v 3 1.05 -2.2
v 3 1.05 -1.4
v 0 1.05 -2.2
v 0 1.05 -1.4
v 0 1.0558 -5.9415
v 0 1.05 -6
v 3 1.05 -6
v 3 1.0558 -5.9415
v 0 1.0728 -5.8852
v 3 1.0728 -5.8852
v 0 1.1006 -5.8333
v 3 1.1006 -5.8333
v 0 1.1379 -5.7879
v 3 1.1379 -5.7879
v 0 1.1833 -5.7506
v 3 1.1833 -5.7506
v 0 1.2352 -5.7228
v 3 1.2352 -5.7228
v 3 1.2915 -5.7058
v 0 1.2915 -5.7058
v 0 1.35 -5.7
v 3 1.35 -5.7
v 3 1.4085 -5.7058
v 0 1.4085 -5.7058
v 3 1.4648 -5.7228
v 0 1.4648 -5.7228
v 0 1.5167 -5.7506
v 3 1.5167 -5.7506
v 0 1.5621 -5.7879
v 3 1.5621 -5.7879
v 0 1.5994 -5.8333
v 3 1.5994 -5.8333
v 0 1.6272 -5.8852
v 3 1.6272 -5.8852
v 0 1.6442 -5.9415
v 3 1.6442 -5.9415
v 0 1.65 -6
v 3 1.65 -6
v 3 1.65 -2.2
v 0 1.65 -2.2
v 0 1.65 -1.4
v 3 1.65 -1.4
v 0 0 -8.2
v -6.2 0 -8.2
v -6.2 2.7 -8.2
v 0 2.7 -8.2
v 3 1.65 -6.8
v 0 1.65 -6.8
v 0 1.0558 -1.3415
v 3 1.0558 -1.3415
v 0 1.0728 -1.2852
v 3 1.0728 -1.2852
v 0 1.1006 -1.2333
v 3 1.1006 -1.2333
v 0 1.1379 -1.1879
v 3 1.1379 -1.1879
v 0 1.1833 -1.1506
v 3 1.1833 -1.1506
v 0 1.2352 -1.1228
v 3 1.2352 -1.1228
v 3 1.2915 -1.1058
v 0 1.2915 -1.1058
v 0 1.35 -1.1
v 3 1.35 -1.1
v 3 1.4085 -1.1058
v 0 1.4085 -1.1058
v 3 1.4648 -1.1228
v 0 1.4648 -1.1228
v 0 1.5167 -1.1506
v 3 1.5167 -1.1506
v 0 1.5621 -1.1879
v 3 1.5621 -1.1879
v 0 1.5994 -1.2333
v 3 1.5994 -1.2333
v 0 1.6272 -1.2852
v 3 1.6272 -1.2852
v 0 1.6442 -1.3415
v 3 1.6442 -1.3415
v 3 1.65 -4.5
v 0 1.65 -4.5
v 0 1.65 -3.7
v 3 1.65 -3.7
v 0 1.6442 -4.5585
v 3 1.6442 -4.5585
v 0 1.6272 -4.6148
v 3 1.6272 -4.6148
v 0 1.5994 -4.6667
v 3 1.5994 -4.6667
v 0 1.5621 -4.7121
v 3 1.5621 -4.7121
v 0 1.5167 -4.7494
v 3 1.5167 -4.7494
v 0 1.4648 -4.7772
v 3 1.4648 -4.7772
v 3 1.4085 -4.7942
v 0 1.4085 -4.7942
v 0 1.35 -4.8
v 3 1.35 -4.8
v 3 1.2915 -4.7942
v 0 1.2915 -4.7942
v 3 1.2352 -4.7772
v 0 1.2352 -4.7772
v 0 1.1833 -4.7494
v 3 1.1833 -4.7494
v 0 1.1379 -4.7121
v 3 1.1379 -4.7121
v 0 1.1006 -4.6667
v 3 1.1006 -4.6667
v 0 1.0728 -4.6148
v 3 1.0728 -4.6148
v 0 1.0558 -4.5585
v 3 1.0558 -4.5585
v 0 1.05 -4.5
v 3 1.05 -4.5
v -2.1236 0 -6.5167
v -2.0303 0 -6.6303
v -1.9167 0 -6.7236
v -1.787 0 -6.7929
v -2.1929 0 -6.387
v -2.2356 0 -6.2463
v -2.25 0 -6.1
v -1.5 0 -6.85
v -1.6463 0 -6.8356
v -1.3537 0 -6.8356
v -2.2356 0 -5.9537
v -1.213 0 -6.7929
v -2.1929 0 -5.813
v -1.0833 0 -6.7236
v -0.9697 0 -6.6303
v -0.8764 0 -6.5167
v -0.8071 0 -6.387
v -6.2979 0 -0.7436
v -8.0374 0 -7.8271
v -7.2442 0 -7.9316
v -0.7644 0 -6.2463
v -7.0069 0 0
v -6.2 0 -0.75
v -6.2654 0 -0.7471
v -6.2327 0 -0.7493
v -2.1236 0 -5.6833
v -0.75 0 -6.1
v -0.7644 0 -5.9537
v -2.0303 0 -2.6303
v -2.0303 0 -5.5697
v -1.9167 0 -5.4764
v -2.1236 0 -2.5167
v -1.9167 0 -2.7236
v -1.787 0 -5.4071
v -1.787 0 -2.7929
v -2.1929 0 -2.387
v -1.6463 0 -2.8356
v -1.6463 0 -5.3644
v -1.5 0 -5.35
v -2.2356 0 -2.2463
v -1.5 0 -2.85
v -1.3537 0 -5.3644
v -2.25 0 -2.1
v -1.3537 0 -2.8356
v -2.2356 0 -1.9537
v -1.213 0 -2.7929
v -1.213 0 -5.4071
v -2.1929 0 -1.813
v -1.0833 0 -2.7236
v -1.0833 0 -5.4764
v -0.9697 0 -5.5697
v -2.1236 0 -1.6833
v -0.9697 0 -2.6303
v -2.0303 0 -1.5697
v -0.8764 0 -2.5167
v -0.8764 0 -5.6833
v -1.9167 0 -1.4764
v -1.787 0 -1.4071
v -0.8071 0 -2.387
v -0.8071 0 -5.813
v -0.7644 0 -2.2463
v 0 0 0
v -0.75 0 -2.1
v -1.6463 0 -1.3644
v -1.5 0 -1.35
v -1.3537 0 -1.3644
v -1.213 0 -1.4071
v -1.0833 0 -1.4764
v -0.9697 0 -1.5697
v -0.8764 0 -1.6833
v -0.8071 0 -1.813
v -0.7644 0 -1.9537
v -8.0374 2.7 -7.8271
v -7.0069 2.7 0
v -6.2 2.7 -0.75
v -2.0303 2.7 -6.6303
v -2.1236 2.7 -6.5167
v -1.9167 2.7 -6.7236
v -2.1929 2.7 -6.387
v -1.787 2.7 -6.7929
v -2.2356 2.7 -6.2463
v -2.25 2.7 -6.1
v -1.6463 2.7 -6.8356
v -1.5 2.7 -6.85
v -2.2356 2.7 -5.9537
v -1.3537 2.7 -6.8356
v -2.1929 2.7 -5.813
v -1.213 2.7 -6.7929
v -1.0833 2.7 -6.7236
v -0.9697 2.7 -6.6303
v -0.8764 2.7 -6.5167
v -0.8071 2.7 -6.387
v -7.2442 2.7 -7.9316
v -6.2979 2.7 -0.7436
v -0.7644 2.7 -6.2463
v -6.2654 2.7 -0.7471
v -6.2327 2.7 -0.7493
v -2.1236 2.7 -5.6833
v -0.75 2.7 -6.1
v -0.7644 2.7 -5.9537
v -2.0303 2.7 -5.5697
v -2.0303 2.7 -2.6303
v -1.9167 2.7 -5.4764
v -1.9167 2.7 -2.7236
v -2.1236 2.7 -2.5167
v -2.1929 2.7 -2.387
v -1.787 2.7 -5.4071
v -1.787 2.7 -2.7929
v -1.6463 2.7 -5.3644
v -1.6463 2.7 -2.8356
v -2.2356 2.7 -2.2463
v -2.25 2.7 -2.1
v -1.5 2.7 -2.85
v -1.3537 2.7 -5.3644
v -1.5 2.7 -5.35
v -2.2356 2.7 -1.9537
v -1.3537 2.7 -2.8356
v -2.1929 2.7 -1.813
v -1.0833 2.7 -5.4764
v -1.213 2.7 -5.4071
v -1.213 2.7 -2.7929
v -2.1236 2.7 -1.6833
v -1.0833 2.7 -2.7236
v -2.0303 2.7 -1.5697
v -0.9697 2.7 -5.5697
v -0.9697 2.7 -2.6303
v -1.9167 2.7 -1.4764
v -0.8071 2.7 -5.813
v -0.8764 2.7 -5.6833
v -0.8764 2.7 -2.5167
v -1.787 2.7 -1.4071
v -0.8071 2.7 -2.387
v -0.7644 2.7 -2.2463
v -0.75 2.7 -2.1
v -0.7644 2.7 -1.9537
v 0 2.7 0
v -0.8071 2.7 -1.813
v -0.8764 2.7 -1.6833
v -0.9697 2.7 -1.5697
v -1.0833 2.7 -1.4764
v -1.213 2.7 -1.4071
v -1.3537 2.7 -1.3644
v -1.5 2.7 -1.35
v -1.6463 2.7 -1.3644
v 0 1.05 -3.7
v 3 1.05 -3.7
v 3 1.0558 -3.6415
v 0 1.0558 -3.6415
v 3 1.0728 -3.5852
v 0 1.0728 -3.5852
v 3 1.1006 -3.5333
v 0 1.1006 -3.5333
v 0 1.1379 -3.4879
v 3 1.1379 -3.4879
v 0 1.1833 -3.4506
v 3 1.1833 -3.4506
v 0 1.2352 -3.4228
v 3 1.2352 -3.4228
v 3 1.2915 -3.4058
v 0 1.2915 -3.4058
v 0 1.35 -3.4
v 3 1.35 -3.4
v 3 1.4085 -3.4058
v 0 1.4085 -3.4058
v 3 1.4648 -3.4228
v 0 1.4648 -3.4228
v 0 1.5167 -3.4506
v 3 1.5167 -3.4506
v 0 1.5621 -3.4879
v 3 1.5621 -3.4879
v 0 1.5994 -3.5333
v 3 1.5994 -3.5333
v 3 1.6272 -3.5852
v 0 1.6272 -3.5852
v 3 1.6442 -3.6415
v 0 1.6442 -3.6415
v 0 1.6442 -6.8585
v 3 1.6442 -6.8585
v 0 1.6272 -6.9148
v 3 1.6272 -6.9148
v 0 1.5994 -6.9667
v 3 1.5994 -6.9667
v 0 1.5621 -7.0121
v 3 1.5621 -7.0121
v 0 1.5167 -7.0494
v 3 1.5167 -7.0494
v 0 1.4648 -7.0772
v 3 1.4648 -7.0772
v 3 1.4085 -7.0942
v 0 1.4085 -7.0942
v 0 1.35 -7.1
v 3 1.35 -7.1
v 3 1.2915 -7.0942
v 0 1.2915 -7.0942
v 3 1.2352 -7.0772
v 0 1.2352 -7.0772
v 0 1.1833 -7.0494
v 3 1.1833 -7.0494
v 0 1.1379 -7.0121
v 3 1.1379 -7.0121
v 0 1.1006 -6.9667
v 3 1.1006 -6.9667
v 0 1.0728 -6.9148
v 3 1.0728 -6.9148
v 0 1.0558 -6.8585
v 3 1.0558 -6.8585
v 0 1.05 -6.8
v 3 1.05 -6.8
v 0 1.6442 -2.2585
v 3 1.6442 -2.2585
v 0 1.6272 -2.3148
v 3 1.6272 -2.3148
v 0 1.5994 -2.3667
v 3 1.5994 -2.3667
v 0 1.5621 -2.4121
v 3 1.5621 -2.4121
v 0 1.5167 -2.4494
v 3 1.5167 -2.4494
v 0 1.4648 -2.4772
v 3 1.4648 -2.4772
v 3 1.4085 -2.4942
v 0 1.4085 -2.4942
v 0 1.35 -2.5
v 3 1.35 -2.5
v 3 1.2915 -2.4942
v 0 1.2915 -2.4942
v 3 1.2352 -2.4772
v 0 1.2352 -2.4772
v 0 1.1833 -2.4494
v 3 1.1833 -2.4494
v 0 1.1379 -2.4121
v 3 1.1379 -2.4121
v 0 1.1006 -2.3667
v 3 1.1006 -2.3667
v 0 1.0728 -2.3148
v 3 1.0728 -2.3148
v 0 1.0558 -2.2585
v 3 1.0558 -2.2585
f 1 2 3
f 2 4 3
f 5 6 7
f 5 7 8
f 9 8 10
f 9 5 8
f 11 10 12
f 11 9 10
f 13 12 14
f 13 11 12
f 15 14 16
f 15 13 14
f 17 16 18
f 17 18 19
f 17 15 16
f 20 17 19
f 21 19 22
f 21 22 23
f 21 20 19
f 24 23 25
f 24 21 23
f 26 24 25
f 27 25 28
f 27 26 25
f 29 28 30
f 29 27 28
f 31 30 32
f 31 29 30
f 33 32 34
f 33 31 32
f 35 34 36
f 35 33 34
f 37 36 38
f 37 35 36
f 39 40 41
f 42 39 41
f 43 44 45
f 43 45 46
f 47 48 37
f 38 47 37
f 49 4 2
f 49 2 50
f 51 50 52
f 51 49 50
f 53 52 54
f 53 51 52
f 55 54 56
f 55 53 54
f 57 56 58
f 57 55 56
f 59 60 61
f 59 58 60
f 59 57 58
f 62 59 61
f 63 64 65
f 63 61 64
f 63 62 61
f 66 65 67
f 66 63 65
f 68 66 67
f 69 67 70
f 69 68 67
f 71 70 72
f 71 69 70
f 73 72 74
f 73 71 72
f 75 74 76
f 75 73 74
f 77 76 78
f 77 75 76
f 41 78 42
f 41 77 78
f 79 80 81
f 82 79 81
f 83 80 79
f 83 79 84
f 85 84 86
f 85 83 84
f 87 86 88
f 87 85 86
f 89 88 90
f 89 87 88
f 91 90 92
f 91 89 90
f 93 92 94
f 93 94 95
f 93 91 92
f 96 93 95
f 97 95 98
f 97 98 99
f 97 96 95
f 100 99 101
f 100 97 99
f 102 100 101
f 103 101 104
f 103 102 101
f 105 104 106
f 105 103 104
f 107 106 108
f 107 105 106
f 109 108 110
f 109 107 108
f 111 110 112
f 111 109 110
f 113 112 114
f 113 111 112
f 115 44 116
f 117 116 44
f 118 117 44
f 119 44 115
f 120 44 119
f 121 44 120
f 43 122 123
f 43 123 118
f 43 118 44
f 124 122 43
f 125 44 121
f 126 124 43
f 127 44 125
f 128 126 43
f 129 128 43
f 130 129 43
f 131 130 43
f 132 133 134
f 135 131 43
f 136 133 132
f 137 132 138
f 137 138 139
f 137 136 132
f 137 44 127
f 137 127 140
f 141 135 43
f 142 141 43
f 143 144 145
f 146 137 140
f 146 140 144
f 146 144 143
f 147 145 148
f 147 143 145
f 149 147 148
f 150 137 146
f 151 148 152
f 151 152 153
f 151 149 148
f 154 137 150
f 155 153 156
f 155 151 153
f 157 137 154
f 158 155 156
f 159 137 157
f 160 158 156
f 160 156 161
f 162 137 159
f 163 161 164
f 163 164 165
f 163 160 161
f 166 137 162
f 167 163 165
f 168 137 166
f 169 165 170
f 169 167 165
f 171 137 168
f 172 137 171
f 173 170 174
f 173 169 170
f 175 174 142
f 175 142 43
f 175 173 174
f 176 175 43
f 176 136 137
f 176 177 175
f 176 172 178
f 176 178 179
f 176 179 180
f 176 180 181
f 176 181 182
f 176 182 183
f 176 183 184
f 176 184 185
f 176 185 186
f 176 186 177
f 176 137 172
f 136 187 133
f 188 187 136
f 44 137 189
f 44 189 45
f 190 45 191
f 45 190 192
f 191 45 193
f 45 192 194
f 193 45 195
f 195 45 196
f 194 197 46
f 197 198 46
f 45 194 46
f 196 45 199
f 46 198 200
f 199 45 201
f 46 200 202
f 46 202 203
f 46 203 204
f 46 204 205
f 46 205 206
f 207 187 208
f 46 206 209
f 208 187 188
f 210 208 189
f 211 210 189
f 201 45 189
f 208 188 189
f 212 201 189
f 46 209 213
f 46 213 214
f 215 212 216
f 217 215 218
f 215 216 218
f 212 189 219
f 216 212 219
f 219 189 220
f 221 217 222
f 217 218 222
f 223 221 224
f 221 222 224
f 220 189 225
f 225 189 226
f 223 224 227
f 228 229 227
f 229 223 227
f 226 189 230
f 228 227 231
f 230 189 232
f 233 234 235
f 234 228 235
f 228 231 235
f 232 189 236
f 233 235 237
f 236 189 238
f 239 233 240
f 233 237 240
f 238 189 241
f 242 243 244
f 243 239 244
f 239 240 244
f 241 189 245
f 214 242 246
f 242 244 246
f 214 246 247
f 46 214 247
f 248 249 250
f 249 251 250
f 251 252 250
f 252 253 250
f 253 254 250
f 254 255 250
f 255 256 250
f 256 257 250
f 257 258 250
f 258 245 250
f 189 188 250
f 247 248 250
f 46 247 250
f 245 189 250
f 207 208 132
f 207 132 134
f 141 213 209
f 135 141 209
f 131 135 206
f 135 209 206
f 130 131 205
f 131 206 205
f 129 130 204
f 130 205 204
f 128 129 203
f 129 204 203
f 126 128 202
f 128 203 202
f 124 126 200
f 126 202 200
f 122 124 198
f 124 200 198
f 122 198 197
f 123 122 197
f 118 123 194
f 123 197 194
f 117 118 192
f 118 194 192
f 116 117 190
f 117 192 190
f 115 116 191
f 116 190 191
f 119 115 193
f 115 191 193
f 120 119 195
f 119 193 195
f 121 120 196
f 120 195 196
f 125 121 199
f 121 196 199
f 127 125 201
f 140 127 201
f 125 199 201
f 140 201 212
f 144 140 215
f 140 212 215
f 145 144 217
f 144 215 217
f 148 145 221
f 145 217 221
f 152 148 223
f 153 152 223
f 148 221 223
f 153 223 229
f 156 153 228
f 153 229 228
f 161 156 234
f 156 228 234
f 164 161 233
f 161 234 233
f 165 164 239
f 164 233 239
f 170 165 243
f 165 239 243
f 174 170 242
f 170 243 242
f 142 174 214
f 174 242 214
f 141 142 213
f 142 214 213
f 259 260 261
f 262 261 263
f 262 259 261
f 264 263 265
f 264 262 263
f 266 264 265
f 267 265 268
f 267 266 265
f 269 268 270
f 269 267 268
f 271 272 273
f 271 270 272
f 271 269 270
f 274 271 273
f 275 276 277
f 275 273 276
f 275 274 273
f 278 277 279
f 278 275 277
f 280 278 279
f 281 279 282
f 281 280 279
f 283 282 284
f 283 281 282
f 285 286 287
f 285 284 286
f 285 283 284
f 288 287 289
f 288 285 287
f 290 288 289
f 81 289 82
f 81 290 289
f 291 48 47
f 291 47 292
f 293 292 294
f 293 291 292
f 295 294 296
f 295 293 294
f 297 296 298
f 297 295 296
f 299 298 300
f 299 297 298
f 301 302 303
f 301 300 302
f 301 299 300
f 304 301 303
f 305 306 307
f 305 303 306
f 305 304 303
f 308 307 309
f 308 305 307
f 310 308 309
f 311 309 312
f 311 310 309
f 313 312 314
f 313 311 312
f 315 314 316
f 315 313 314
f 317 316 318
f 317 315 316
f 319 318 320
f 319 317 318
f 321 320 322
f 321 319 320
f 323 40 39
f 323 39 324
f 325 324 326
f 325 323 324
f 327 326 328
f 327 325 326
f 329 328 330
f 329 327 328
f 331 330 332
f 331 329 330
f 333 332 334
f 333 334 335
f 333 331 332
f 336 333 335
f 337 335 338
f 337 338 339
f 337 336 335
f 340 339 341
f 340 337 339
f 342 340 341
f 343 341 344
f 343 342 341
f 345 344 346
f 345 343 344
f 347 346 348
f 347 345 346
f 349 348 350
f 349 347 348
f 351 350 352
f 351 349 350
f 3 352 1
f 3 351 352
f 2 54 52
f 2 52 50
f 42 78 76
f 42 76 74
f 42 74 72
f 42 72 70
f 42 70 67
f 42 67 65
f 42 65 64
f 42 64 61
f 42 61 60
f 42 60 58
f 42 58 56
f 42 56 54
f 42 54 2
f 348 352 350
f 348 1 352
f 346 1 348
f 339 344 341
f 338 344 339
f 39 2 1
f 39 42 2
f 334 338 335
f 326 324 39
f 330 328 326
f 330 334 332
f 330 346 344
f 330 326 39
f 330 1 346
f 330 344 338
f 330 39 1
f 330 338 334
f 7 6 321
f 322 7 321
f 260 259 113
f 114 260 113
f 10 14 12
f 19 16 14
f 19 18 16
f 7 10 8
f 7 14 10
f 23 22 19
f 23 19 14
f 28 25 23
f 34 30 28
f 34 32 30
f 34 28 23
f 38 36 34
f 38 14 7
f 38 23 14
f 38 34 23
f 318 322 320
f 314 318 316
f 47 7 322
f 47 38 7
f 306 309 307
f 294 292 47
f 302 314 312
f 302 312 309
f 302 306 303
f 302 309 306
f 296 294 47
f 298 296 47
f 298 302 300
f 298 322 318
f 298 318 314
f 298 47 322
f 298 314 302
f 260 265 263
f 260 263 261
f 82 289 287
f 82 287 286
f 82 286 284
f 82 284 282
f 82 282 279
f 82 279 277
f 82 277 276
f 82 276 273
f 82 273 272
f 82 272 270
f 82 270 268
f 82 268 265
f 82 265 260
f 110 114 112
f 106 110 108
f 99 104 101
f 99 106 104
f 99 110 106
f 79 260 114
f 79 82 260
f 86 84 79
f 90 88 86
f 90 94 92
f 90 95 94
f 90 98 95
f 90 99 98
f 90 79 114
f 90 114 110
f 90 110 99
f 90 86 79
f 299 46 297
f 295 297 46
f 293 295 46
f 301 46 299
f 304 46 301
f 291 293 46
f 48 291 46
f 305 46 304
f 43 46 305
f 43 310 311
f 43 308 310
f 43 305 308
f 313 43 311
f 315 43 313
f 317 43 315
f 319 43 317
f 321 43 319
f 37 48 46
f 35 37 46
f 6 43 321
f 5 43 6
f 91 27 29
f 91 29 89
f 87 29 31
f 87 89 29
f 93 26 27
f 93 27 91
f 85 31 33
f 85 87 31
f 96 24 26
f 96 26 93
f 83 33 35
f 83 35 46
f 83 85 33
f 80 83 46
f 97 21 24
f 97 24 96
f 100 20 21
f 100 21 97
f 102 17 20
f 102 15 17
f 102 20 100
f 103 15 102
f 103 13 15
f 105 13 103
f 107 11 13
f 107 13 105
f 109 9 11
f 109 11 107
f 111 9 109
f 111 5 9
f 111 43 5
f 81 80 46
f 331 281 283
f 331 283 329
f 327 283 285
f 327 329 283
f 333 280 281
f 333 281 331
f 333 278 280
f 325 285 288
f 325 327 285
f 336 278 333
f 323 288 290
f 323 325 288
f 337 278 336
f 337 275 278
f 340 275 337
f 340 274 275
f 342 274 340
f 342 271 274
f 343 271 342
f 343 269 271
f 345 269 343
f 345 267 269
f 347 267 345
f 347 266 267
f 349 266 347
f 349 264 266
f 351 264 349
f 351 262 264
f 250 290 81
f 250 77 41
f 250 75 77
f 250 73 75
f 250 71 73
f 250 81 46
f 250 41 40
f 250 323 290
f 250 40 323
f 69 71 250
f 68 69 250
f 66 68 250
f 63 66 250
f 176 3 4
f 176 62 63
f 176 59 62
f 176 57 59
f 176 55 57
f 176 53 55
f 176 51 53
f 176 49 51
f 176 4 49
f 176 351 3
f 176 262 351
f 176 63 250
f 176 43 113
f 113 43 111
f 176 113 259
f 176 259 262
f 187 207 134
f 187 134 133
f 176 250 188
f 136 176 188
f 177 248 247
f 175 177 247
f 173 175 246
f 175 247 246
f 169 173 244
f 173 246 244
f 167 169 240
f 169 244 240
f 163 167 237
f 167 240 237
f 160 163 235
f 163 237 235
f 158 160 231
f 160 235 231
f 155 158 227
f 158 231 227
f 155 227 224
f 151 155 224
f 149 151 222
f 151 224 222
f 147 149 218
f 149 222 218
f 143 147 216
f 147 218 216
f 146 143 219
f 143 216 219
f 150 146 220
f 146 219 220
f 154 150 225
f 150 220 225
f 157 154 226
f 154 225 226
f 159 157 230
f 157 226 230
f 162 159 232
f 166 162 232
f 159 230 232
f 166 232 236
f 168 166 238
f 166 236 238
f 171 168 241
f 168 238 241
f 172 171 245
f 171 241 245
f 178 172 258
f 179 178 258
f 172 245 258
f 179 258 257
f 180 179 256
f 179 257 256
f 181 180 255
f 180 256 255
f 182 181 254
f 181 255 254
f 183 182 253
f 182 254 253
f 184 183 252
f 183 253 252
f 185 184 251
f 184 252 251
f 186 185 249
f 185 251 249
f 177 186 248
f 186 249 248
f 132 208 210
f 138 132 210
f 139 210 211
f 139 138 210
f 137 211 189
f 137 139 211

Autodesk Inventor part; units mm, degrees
ref_plane "YZ Plane" through (0, 0, 0) normal (1, 0, 0) x (0, 1, 0)
ref_plane "XZ Plane" through (0, 0, 0) normal (0, 1, 0) x (-1, 0, 0)
ref_plane "XY Plane" through (0, 0, 0) normal (0, 0, 1) x (1, 0, 0)
sketch "Sketch1" plane through (0, 0, 0) normal (0, 1, 0) x (-1, 0, 0)
  line L0 (0, 0) -> (6.2, 0)
  line L1 (6.2, 0) -> (6.2, -8.2)
  line L2 (6.2, -8.2) -> (0, -8.2)
  line L3 (0, -8.2) -> (0, 0)
  dimension "d0" = 8.2
  dimension "d1" = 6.2
extrude "Extrusion1" add sketch "Sketch1" along normal blind 2.7
sketch "Sketch2" plane through (0, 2.7, 0) normal (0, 1, 0) x (1, 0, 0)
  line L0 (-6.2, 8.2) -> (-6.2, 0) projected
  line L1 (-6.2, 0) -> (0, 0) projected
  line L2 (0, 0) -> (0, 8.2) projected
  line L3 (0, 8.2) -> (-6.2, 8.2) projected
  line L4 (-6.2, 8.2) -> (-6.2, 0) projected
  line L5 (-6.2, 0) -> (-7.2442, 7.9316)
  line L6 (-7.2442, 7.9316) -> (-8.0374, 7.8271)
  line L7 (-8.0374, 7.8271) -> (-7.0069, 0)
  line L8 (-6.2, 0) -> (-7.0069, 0)
  dimension "d4" = 8
  dimension "d5" = 7.5
  dimension "d6" = 0.8
extrude "Extrusion2" add sketch "Sketch2" against normal up to surface (2.7 mm away) contours L8 L7 L6 L5
sketch "Sketch3" plane through (0, 0, 0) normal (0, -1, 0) x (1, 0, 0)
  line L0 (-6.2, -8.2) -> (-6.2, 0) projected
  line L1 (0, -8.2) -> (-6.2, -8.2) projected
  line L2 (0, 0) -> (0, -8.2) projected
  line L3 (-6.2, 0) -> (0, 0) projected
  line L4 (-7.0069, 0) -> (-8.0374, -7.8271) projected
  line L5 (-8.0374, -7.8271) -> (-7.2442, -7.9316) projected
  line L6 (-7.2442, -7.9316) -> (-6.2, 0) projected
  line L7 (-6.2, 0) -> (-7.0069, 0) projected
  line L8 (-6.2, 0) -> (0, 0) projected
  circle A0 centre (-6.2, 0) radius 0.75
  point P0 (-6.2979, -0.7436)
  point P1 (-6.2, -0.75)
  dimension "d9" = 1.5
extrude "Extrusion3" add sketch "Sketch3" against normal up to surface (2.7 mm away) contours A0 L6 L0
sketch "Sketch4" plane through (0, 2.7, 0) normal (0, 1, 0) x (1, 0, 0)
  line L0 (-6.2, 8.2) -> (-6.2, 0.75) projected
  arc A0 (-6.2, 0.75) -> (-6.2979, 0.7436) centre (-6.2, 0) ccw projected
  line L1 (-6.2979, 0.7436) -> (-7.2442, 7.9316) projected
  line L2 (-7.2442, 7.9316) -> (-8.0374, 7.8271) projected
  line L3 (-8.0374, 7.8271) -> (-7.0069, 0) projected
  line L4 (-7.0069, 0) -> (0, 0) projected
  line L5 (0, 0) -> (0, 8.2) projected
  line L6 (0, 8.2) -> (-6.2, 8.2) projected
  line L7 (0, 0) -> (0, 8.2) projected
  line L8 (0, 4.1) -> (-1.5, 4.1)
  line L9 (-1.5, 4.1) -> (-1.5, 6.1)
  line L10 (-1.5, 4.1) -> (-1.5, 2.1)
  circle A1 centre (-1.5, 2.1) radius 0.75
  circle A2 centre (-1.5, 6.1) radius 0.75
  dimension "d12" = 1.5
  dimension "d13" = 2
  dimension "d14" = 2
  dimension "d15" = 1.5
  dimension "d16" = 1.5
extrude "Extrusion4" cut sketch "Sketch4" against normal blind 2.7 contours A1 | A2
sketch "Sketch5" plane through (0, 0, 0) normal (1, 0, 0) x (0, 0, -1)
  line L0 (0, 0) -> (8.2, 0) projected
  line L1 (8.2, 0) -> (8.2, 2.7) projected
  line L2 (0, 2.7) -> (8.2, 2.7) projected
  line L3 (0, 0) -> (0, 2.7) projected
  line L4 (0.7436, 2.7) -> (7.9316, 2.7) projected
  line L5 (4.1, 2.7) -> (4.1, 1.35)
  line L6 (7.9316, 0) -> (0.7436, 0) projected
  line L7 (3.7, 1.35) -> (4.5, 1.35) construction
  line L8 (3.7, 1.05) -> (4.5, 1.05)
  line L9 (4.5, 1.65) -> (3.7, 1.65)
  arc A0 (3.7, 1.65) -> (3.7, 1.05) centre (3.7, 1.35) ccw
  arc A1 (4.5, 1.05) -> (4.5, 1.65) centre (4.5, 1.35) ccw
  line L10 (4.1, 1.35) -> (6.4, 1.35)
  line L11 (6, 1.35) -> (6.8, 1.35) construction
  line L12 (6, 1.05) -> (6.8, 1.05)
  line L13 (6.8, 1.65) -> (6, 1.65)
  arc A2 (6, 1.65) -> (6, 1.05) centre (6, 1.35) ccw
  arc A3 (6.8, 1.05) -> (6.8, 1.65) centre (6.8, 1.35) ccw
  line L14 (4.1, 1.35) -> (1.8, 1.35)
  line L15 (1.4, 1.35) -> (2.2, 1.35) construction
  line L16 (1.4, 1.05) -> (2.2, 1.05)
  line L17 (2.2, 1.65) -> (1.4, 1.65)
  arc A4 (1.4, 1.65) -> (1.4, 1.05) centre (1.4, 1.35) ccw
  arc A5 (2.2, 1.05) -> (2.2, 1.65) centre (2.2, 1.35) ccw
  dimension "d19" = 1.35
  dimension "d20" = 0.4
  dimension "d21" = 0.6
  dimension "d22" = 2.3
  dimension "d23" = 0.4
  dimension "d24" = 0.6
  dimension "d25" = 2.3
  dimension "d26" = 0.4
  dimension "d27" = 0.6
extrude "Extrusion5" add sketch "Sketch5" along normal blind 3 contours A2 L13 A3 L12 | A5 L16 A4 L17 | L9 A1 L10 L5 | L5 L14 A0 L9 | L10 A1 L8 A0 L14
properties part number "micro_switch_1"
